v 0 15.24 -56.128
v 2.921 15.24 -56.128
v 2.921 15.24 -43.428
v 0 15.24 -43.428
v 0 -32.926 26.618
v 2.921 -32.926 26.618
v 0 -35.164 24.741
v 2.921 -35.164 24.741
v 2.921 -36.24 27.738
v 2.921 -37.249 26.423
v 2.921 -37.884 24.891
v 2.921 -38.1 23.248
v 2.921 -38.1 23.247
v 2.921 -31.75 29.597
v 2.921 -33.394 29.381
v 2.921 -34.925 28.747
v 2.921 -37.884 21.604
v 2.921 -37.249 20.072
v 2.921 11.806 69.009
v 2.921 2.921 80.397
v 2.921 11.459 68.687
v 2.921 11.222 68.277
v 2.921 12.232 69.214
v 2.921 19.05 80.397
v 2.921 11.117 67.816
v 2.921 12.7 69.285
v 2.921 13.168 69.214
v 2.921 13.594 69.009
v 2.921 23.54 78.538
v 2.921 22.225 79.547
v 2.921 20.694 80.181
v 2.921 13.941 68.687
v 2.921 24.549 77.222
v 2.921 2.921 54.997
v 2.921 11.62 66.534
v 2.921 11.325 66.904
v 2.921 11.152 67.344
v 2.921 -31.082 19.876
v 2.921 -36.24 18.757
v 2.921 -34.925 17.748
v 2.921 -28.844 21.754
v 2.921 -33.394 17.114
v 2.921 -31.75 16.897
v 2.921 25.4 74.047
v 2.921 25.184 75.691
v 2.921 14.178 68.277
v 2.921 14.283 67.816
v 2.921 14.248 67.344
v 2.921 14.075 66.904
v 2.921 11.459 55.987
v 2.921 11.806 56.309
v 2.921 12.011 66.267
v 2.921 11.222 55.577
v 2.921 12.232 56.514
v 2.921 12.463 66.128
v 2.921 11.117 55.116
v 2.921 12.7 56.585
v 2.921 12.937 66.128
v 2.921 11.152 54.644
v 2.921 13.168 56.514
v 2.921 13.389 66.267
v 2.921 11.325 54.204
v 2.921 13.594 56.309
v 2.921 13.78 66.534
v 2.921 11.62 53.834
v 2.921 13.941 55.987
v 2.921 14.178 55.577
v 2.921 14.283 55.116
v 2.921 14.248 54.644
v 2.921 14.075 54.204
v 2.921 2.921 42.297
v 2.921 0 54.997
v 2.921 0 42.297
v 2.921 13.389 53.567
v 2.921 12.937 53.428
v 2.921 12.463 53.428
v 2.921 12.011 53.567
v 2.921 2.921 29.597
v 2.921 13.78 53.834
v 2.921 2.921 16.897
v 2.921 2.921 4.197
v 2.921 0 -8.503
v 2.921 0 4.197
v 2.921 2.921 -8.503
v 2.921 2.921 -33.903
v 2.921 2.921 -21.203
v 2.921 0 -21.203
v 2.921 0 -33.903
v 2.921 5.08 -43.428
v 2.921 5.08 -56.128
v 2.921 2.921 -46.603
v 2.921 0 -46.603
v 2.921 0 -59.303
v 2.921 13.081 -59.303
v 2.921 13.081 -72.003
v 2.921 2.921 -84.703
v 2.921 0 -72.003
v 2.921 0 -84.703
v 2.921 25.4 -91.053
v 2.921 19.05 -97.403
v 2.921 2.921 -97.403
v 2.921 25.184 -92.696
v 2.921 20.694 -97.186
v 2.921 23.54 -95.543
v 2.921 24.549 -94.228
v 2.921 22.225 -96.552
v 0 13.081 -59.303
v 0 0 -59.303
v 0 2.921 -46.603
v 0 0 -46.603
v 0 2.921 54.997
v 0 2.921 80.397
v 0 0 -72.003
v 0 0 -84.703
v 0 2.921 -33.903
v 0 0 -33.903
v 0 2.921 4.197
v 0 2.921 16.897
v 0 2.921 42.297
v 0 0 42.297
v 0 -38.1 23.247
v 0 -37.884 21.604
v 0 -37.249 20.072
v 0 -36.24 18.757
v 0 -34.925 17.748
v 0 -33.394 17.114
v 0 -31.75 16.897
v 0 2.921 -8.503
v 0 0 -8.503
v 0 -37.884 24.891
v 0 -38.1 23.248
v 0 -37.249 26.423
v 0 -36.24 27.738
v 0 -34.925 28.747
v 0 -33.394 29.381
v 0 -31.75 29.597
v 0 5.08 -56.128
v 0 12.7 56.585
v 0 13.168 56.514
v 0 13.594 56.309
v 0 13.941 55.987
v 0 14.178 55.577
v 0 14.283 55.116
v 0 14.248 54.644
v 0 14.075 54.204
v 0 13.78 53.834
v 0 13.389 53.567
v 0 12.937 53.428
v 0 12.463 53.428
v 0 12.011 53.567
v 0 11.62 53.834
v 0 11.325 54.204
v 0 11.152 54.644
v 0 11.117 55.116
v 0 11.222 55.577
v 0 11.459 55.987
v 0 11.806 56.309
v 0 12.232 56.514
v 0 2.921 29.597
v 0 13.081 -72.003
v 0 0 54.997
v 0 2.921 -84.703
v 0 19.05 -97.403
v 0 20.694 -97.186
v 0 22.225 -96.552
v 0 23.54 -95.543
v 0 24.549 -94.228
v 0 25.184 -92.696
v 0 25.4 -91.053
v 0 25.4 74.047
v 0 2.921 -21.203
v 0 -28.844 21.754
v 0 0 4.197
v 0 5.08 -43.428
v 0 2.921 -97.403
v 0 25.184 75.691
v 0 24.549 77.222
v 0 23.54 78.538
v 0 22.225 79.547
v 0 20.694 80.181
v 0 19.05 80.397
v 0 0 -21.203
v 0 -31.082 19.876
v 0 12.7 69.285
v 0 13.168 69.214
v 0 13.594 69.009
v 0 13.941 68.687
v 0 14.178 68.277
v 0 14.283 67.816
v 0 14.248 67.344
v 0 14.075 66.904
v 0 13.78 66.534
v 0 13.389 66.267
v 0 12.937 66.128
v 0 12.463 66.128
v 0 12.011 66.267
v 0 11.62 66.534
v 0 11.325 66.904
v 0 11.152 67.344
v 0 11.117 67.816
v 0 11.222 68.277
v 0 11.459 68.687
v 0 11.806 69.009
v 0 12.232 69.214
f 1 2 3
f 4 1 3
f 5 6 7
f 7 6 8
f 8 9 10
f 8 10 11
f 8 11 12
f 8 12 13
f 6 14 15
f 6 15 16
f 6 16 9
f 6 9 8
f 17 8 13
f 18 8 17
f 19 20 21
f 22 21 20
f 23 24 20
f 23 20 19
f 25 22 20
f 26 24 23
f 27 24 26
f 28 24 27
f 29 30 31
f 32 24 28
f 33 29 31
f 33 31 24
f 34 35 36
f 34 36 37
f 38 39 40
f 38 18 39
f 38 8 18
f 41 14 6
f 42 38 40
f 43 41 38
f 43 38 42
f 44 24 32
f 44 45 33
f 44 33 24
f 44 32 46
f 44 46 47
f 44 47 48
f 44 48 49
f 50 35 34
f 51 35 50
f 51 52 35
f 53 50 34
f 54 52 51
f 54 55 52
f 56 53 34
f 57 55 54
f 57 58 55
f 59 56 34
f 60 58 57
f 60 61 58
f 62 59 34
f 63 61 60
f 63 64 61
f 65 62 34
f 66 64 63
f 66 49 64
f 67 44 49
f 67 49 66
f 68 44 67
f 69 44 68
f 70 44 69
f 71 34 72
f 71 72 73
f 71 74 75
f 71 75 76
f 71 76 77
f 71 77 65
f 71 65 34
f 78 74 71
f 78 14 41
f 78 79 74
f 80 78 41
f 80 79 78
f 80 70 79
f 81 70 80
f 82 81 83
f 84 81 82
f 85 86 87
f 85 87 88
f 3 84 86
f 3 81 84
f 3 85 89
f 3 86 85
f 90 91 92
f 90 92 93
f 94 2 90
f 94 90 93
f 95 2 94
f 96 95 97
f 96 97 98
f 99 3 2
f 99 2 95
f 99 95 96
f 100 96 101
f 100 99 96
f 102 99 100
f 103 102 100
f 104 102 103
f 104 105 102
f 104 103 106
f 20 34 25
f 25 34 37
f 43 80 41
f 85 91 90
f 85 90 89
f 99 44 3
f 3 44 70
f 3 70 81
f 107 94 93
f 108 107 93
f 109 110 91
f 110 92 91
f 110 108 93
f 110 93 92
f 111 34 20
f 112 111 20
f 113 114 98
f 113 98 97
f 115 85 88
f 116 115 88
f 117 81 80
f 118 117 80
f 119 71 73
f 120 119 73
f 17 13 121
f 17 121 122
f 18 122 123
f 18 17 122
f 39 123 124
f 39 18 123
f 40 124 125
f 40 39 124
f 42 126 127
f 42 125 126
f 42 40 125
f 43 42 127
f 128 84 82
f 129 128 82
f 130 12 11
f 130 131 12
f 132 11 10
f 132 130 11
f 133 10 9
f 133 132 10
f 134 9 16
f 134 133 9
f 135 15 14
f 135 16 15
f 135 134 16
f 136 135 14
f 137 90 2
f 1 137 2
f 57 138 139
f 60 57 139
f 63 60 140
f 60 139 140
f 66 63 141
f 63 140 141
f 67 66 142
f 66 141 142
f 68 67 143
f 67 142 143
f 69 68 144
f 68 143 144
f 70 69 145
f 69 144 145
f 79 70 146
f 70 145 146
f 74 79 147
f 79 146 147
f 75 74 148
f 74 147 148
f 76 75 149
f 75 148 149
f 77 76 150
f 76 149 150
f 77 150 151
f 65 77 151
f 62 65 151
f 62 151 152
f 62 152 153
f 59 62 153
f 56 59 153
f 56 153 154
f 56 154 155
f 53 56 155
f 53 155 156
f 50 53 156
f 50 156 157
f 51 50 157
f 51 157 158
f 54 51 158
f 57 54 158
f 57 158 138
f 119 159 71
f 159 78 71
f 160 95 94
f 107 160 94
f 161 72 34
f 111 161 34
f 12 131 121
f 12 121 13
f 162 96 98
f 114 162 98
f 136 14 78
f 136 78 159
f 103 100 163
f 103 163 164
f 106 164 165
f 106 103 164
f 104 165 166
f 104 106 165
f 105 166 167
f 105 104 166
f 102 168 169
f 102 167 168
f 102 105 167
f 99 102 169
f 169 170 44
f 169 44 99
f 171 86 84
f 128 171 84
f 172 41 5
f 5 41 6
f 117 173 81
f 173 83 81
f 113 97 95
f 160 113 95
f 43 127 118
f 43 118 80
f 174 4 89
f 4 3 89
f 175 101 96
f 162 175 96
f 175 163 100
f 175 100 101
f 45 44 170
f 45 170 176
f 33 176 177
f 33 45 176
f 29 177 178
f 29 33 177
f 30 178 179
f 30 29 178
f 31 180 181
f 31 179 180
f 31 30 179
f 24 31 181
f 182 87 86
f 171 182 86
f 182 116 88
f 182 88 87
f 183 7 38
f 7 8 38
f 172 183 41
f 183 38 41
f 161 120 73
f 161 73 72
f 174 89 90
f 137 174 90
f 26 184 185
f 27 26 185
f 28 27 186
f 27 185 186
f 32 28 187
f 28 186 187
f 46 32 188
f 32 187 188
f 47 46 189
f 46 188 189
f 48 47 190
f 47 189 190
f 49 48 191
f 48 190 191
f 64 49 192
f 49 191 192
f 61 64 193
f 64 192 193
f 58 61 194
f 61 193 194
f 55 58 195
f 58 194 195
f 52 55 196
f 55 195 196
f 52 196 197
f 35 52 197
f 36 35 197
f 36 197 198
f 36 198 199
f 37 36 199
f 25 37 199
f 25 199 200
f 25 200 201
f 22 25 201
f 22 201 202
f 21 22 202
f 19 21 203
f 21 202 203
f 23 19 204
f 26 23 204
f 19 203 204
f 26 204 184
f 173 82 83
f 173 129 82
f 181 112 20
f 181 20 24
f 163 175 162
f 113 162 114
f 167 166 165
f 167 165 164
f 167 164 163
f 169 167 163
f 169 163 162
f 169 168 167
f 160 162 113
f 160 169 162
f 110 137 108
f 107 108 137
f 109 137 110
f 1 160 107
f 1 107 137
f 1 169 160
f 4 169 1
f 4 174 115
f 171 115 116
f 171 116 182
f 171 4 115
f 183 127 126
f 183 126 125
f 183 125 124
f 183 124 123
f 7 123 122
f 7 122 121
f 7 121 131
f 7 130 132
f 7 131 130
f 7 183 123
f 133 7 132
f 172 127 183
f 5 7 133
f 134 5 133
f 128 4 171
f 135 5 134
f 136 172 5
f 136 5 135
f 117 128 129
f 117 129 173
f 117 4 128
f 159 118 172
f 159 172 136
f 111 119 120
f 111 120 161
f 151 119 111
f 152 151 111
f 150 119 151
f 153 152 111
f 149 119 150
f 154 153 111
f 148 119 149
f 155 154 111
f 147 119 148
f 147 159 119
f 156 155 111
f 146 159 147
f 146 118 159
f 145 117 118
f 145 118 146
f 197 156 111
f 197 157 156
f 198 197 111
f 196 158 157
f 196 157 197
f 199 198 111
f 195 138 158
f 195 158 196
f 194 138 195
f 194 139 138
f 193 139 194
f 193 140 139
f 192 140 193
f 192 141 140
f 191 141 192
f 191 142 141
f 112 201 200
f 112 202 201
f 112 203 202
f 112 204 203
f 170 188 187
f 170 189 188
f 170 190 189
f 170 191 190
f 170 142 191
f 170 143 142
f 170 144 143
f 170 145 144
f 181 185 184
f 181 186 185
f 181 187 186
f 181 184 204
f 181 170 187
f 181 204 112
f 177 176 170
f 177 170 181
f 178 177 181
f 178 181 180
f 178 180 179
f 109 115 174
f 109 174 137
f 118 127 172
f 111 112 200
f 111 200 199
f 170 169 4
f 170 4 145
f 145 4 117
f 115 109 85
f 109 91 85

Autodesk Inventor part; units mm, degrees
ref_plane "YZ Plane" through (0, 0, 0) normal (1, 0, 0) x (0, 1, 0)
ref_plane "XZ Plane" through (0, 0, 0) normal (0, 1, 0) x (-1, 0, 0)
ref_plane "XY Plane" through (0, 0, 0) normal (0, 0, 1) x (1, 0, 0)
sketch "Sketch1" plane through (0, 0, 0) normal (1, 0, 0) x (0, 1, 0)
  line L0 (0, 80.3974) -> (25.4, 80.3974)
  line L1 (25.4, 80.3974) -> (25.4, -97.4026)
  line L2 (25.4, -97.4026) -> (0, -97.4026)
  line L3 (0, -97.4026) -> (0, 80.3974)
  point P0 (0, 0)
  dimension "d0" = 177.8
  dimension "d1" = 25.4
  dimension "d2" = 0
extrude "Extrusion1" add sketch "Sketch1" along normal blind 2.921
sketch "Sketch2" plane through (2.921, 0, 0) normal (1, 0, 0) x (0, 0, -1)
  line L0 (-80.3974, 0) -> (97.4026, 0) projected
  line L1 (-67.6974, 0) -> (-54.9974, 0)
  line L2 (-54.9974, 0) -> (-54.9974, 2.921)
  line L3 (-54.9974, 2.921) -> (-67.6974, 2.921)
  line L4 (-67.6974, 2.921) -> (-67.6974, 0)
  line L5 (-80.3974, 25.4) -> (-80.3974, 0) projected
  line L6 (-42.2974, 0) -> (-29.5974, 0)
  line L7 (-29.5974, 0) -> (-29.5974, 2.921)
  line L8 (-29.5974, 2.921) -> (-42.2974, 2.921)
  line L9 (-42.2974, 2.921) -> (-42.2974, 0)
  line L10 (-16.8974, 0) -> (-4.1974, 0)
  line L11 (-4.1974, 0) -> (-4.1974, 2.921)
  line L12 (-4.1974, 2.921) -> (-16.8974, 2.921)
  line L13 (-16.8974, 2.921) -> (-16.8974, 0)
  line L14 (8.5026, 0) -> (21.2026, 0)
  line L15 (21.2026, 0) -> (21.2026, 2.921)
  line L16 (21.2026, 2.921) -> (8.5026, 2.921)
  line L17 (8.5026, 2.921) -> (8.5026, 0)
  line L18 (33.9026, 0) -> (46.6026, 0)
  line L19 (46.6026, 0) -> (46.6026, 2.921)
  line L20 (46.6026, 2.921) -> (33.9026, 2.921)
  line L21 (33.9026, 2.921) -> (33.9026, 0)
  line L22 (59.3026, 0) -> (72.0026, 0)
  line L23 (72.0026, 0) -> (72.0026, 2.921)
  line L24 (72.0026, 2.921) -> (59.3026, 2.921)
  line L25 (59.3026, 2.921) -> (59.3026, 0)
  line L26 (84.7026, 0) -> (97.4026, 0)
  line L27 (97.4026, 0) -> (97.4026, 2.921)
  line L28 (97.4026, 2.921) -> (84.7026, 2.921)
  line L29 (84.7026, 2.921) -> (84.7026, 0)
  point P0 (0, 0)
  dimension "d5" = 12.7
  dimension "d6" = 2.921
  dimension "d7" = 12.7
  dimension "d10" = 25.4
extrude "Extrusion2" cut sketch "Sketch2" against normal blind 2.921
sketch "Sketch3" plane through (2.921, 0, 0) normal (1, 0, 0) x (0, 0, -1)
  line L0 (-67.6974, 2.921) -> (-67.6974, 0) projected
  line L1 (-80.3974, 25.4) -> (-80.3974, 0) projected
  line L2 (-67.6974, 2.921) -> (-80.3974, 2.921)
  line L3 (-80.3974, 2.921) -> (-80.3974, 0)
  line L4 (-80.3974, 0) -> (-67.6974, 0)
  line L5 (-67.6974, 0) -> (-67.6974, 2.921)
  point P0 (0, 0)
extrude "Extrusion3" cut sketch "Sketch3" against normal blind 25.4
sketch "Sketch4" plane through (0, 0, 16.8974) normal (0, -1, 0) x (1, 0, 0)
  line L0 (2.921, 12.7) -> (0, 12.7) projected
  line L1 (0, 0) -> (0, 12.7) projected
  line L2 (0, 0) -> (2.921, 0) projected
  line L3 (2.921, 12.7) -> (2.921, 0) projected
  point P0 (0, -16.8974)
extrude "Extrusion4" add sketch "Sketch4" along normal blind 38.1
fillet "Fillet1" radius 6.35 2 edges at (1.4605, -38.1, 29.5974) (1.4605, -38.1, 16.8974)
sketch "Sketch5" plane through (2.921, 0, 0) normal (1, 0, 0) x (0, 0, -1)
  line L0 (-21.754, -28.8443) -> (-26.6184, -32.926)
  line L1 (-26.6184, -32.926) -> (-24.7408, -35.1637)
  line L2 (-24.7408, -35.1637) -> (-19.8764, -31.082)
  line L3 (-19.8764, -31.082) -> (-21.754, -28.8443)
  line L4 (-21.754, -28.8443) -> (-24.7408, -35.1637) construction
  line L5 (-26.6184, -32.926) -> (-19.8764, -31.082) construction
  line L6 (-16.8974, 2.921) -> (-16.8974, -31.75) projected
  line L7 (-16.8974, 2.921) -> (-4.1974, 2.921) projected
  point P0 (0, 0)
  point P1 (-23.2474, -32.004)
  dimension "d22" = 6.35
  dimension "d23" = 2.921
  dimension "d24" = 6.35
  dimension "d25" = 34.925
  dimension "d29" = 40
extrude "Extrusion5" cut sketch "Sketch5" against normal blind 38.1
sketch "Sketch6" plane through (0, 0, 0) normal (-1, 0, 0) x (0, 0, 1)
  circle A0 centre (67.6974, 12.7) radius 1.5875
  circle A1 centre (54.9974, 12.7) radius 1.5875
  line L0 (80.3974, 25.4) -> (-97.4026, 25.4) projected
  line L1 (80.3974, 2.921) -> (80.3974, 25.4) projected
  point P0 (0, 0)
  dimension "d30" = 3.175
  dimension "d31" = 3.175
  dimension "d32" = 12.7
  dimension "d33" = 12.7
  dimension "d34" = 12.7
  dimension "d35" = 12.7
extrude "Extrusion6" cut sketch "Sketch6" against normal blind 38.1
fillet "Fillet2" radius 6.35 2 edges at (1.4605, 25.4, -97.4026) (1.4605, 25.4, 80.3974)
sketch "Sketch7" plane through (2.921, 0, 0) normal (1, 0, 0) x (0, 0, -1)
  line L0 (59.3026, 2.921) -> (72.0026, 2.921)
  line L1 (72.0026, 2.921) -> (72.0026, 13.081)
  line L2 (72.0026, 13.081) -> (59.3026, 13.081)
  line L3 (59.3026, 13.081) -> (59.3026, 2.921)
  point P0 (0, 0)
  dimension "d39" = 12.7
  dimension "d40" = 10.16
extrude "Extrusion7" cut sketch "Sketch7" against normal blind 25.4
sketch "Sketch9" plane through (2.921, 0, 0) normal (1, 0, 0) x (0, 0, -1)
  line L0 (56.1276, 15.24) -> (43.4276, 15.24)
  line L1 (43.4276, 15.24) -> (43.4276, 5.08)
  line L2 (43.4276, 5.08) -> (56.1276, 5.08)
  line L3 (56.1276, 5.08) -> (56.1276, 15.24)
  line L4 (59.3026, 0) -> (59.3026, 13.081) projected
  line L5 (97.4026, 2.921) -> (97.4026, 19.05) projected
  line L6 (46.6026, 0) -> (59.3026, 0) projected
  point P0 (0, 0)
  dimension "d43" = 3.175
  dimension "d44" = 53.975
  dimension "d45" = 10.16
  dimension "d46" = 5.08
extrude "Extrusion8" cut sketch "Sketch9" against normal blind 25.4
properties part number "wall"
